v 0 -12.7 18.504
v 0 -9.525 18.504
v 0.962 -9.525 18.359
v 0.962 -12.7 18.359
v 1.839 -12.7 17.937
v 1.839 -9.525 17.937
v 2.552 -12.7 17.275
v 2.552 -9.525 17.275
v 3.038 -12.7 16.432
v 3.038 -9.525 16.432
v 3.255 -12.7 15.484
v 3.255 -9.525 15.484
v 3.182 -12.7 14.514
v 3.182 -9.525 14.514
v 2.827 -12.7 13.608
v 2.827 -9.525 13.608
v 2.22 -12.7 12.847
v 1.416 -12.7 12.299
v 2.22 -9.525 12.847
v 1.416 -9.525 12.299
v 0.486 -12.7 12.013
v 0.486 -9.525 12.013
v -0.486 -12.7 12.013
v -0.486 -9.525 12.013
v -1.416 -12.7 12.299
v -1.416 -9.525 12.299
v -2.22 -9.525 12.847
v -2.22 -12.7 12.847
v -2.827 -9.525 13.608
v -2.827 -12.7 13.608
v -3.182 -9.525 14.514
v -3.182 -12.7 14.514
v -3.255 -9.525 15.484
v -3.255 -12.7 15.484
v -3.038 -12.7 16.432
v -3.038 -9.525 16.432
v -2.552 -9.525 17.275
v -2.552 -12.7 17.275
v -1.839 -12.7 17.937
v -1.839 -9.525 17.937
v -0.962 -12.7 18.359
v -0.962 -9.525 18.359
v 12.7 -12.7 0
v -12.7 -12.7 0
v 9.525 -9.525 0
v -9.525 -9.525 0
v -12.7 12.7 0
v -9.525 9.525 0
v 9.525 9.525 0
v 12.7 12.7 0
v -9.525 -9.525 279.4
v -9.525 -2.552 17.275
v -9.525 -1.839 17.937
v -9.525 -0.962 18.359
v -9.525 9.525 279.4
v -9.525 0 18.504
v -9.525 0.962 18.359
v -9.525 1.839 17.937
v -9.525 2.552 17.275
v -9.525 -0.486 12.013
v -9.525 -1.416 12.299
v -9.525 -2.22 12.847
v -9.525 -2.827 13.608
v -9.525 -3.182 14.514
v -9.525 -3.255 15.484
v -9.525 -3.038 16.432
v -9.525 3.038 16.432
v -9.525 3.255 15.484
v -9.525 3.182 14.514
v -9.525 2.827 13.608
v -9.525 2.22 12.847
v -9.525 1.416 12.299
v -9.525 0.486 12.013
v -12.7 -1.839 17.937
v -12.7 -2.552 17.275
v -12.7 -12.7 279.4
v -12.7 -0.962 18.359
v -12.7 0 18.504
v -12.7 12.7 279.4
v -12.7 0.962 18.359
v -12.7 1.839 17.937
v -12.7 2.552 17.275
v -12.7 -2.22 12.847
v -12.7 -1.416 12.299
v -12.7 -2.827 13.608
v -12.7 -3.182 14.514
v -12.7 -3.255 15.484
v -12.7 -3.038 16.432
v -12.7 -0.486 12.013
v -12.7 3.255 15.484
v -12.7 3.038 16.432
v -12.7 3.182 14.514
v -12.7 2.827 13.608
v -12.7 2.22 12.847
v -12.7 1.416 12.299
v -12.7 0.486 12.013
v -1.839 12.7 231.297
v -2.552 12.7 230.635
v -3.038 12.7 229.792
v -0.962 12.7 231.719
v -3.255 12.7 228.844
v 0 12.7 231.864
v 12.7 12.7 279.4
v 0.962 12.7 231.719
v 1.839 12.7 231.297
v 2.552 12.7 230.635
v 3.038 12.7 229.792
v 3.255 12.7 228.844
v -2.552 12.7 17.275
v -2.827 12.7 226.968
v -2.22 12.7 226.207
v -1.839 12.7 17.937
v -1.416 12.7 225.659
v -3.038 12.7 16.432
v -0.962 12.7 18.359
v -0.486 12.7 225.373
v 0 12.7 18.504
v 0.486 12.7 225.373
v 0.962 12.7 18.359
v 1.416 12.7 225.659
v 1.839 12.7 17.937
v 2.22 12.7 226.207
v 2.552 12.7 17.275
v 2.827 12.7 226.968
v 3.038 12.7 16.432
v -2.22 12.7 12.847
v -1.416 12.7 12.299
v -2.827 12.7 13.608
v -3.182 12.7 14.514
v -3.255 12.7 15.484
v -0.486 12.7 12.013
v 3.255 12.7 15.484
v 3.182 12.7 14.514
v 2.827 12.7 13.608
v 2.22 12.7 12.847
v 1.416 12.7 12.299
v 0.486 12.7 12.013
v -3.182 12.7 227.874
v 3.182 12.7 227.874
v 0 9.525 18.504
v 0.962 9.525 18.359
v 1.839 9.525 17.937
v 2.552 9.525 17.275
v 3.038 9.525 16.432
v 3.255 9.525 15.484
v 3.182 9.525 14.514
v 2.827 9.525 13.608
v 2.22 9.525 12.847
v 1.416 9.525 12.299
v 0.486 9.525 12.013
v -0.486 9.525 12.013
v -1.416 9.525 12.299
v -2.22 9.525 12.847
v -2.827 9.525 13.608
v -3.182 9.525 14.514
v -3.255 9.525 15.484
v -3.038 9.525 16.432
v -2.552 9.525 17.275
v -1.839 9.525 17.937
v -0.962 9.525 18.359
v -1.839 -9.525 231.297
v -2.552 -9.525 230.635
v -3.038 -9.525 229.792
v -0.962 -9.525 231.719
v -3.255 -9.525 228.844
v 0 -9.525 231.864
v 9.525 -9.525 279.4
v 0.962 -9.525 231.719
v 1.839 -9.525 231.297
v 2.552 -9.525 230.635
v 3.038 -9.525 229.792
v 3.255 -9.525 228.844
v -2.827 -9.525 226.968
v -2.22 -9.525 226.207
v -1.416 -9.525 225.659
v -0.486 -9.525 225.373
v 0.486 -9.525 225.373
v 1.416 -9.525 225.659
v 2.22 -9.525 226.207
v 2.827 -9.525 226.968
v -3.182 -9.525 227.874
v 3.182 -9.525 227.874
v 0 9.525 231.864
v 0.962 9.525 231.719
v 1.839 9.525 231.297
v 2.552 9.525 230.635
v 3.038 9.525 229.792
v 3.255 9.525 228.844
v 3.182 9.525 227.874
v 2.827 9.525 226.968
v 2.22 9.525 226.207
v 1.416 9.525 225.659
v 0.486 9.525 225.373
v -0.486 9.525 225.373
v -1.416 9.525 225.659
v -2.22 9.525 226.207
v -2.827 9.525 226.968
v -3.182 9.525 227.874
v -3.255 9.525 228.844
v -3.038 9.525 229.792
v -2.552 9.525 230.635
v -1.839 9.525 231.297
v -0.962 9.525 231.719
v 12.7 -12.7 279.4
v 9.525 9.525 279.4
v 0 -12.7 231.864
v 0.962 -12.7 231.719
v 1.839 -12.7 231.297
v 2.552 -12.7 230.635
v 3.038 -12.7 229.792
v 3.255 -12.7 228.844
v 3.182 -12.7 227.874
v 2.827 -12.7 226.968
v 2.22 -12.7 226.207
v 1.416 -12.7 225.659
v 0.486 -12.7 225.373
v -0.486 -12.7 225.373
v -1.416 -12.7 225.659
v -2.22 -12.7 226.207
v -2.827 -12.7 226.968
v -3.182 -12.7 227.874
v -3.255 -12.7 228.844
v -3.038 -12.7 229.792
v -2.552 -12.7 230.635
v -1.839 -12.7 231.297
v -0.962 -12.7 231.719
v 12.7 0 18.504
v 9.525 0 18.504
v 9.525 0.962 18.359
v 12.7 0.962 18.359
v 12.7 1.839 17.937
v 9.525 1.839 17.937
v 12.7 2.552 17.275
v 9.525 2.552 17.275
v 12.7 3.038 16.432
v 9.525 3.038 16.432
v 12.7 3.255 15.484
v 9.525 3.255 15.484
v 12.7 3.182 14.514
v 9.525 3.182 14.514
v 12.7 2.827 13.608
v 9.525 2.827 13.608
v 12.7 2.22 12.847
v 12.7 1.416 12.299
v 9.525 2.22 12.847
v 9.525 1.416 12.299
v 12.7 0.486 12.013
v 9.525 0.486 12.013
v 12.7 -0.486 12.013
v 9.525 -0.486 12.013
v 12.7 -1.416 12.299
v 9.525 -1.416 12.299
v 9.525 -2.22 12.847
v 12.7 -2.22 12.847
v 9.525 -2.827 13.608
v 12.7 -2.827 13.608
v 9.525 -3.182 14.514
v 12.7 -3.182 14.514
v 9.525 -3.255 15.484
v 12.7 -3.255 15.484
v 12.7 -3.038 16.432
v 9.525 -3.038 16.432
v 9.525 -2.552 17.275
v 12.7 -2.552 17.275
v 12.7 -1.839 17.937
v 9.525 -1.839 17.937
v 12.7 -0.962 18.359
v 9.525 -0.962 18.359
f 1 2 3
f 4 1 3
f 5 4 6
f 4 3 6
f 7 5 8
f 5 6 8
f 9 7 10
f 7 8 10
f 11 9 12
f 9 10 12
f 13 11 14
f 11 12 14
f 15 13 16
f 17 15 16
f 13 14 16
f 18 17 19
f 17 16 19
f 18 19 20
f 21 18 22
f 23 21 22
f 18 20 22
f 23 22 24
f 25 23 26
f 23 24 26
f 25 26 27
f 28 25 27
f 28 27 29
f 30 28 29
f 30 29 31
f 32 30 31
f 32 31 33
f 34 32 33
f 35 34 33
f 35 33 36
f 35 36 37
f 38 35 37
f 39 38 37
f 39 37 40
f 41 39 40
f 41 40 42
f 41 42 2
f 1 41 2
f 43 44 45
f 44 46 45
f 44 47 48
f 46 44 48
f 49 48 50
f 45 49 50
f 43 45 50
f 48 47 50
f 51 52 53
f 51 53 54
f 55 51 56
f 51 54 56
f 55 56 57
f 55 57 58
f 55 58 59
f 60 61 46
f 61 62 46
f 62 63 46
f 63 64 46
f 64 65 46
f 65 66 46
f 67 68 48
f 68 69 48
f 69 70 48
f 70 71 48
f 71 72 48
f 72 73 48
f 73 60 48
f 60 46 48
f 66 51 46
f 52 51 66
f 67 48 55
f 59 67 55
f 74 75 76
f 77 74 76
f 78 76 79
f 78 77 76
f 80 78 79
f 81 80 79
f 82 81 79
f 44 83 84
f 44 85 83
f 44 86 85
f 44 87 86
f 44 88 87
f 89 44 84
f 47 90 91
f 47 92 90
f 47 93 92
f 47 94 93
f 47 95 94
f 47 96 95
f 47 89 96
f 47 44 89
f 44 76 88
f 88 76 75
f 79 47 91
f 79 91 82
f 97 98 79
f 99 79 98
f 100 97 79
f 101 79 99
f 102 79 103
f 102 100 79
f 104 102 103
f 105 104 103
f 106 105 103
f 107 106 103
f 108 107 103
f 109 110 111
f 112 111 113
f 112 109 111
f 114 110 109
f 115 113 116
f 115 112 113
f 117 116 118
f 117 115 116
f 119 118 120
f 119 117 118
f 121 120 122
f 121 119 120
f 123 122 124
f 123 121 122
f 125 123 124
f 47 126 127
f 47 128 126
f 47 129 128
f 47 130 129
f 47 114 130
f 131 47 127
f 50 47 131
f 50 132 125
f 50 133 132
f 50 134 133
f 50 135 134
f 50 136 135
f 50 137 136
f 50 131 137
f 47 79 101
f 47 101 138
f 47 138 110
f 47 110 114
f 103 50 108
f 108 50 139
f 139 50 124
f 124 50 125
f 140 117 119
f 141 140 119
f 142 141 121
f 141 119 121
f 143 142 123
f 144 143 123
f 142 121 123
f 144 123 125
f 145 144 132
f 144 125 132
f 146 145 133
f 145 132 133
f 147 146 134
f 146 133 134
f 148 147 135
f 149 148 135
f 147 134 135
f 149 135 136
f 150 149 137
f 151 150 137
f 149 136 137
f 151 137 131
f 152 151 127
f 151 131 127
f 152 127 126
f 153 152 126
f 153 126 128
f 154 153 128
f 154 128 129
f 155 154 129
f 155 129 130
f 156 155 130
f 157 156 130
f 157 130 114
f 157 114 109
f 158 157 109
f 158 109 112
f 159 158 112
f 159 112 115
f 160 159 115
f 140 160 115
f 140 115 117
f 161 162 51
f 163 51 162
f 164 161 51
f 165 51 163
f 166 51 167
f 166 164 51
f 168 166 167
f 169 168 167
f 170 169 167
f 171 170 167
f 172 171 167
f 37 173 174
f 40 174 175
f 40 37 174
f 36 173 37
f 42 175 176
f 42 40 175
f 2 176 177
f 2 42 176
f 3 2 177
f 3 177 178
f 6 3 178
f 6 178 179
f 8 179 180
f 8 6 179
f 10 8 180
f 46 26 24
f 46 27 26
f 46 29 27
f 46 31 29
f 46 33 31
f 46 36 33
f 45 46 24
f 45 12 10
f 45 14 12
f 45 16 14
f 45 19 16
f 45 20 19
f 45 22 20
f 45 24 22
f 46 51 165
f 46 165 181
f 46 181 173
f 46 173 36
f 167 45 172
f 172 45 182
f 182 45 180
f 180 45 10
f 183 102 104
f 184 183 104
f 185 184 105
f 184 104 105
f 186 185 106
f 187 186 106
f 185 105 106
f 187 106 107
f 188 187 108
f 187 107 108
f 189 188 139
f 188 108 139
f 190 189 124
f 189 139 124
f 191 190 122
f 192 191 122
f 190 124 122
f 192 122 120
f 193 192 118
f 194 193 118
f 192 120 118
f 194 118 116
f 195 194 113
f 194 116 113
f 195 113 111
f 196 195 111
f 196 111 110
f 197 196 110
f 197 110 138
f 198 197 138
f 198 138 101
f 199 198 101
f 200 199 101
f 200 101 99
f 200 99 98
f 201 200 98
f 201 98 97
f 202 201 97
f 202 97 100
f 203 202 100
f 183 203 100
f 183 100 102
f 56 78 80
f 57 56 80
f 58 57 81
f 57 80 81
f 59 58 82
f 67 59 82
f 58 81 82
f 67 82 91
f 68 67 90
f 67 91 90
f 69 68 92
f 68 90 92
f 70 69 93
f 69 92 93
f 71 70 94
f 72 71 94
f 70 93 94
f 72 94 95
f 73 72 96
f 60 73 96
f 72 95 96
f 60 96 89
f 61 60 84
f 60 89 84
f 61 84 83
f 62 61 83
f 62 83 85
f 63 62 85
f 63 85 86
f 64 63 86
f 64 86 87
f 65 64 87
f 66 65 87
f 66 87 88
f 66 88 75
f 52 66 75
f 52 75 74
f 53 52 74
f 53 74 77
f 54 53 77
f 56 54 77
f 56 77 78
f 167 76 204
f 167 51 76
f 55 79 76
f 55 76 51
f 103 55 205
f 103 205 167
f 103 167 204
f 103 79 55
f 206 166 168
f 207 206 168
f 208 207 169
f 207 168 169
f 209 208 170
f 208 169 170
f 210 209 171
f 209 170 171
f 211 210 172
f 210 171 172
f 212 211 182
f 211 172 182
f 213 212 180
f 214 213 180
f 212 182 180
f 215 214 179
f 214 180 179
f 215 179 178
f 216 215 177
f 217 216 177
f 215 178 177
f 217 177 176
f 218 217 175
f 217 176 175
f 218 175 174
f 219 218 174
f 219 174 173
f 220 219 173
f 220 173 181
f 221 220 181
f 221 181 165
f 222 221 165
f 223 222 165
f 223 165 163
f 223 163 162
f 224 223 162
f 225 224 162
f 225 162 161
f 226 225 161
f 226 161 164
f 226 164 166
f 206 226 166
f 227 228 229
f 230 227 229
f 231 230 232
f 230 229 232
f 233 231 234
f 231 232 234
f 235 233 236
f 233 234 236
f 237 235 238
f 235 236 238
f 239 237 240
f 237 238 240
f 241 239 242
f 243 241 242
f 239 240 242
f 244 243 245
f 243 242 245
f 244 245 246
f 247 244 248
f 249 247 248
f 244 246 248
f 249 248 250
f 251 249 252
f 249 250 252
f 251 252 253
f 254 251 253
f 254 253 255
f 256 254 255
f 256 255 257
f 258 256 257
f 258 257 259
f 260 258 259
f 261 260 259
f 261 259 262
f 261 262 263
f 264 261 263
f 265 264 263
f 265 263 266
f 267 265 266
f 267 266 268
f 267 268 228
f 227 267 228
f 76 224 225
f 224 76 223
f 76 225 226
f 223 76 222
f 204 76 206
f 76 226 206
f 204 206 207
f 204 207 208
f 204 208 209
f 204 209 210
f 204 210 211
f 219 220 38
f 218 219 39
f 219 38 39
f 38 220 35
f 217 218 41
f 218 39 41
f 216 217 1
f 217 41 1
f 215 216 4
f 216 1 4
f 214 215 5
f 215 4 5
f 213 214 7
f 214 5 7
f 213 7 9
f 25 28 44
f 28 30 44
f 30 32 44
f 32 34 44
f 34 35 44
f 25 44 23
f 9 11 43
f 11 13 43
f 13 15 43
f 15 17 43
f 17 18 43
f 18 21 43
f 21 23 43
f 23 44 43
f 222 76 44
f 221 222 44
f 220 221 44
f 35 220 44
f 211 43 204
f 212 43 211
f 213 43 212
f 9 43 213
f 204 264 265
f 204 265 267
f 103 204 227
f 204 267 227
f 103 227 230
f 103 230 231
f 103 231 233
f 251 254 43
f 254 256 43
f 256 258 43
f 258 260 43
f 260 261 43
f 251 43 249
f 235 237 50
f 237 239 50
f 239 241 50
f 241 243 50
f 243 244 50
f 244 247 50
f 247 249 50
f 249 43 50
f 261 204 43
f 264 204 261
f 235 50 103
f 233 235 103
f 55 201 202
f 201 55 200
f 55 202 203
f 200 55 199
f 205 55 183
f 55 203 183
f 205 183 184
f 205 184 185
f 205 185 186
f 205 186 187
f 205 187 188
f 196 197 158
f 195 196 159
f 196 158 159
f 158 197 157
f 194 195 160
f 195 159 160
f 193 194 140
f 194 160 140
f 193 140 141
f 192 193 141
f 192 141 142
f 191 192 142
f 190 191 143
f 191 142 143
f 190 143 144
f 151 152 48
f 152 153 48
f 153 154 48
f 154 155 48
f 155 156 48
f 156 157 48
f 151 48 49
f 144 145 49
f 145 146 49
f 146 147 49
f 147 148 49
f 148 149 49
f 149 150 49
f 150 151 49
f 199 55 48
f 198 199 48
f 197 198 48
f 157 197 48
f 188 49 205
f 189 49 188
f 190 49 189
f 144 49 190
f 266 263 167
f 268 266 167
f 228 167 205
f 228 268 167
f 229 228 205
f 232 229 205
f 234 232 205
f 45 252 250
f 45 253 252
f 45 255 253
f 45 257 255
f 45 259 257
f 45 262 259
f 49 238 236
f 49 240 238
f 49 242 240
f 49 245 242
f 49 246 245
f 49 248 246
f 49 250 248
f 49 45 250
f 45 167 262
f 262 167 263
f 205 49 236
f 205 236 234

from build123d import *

# Parameters (mm, degrees)
SKETCH2_W           = 25.4
SKETCH2_H           = 25.4
BOSS_EXTRUDE1_DEPTH = 279.4
SKETCH4_W           = 19.05
SKETCH4_H           = 19.05
CUT_EXTRUDE1_DEPTH  = 280.9766776
SKETCH5_R           = 3.2639
CUT_EXTRUDE2_DEPTH  = 281.839473721
SKETCH6_R           = 3.2639
CUT_EXTRUDE3_DEPTH  = 281.839473721
SKETCH7_R           = 3.2639
CUT_EXTRUDE4_DEPTH  = 281.839473721


with BuildPart() as part:
    # Sketch2 → Boss-Extrude1 (new body)
    with BuildSketch(Plane.XY):
        Rectangle(SKETCH2_W, SKETCH2_H)
    extrude(amount=BOSS_EXTRUDE1_DEPTH)

    # Sketch4 → Cut-Extrude1 (cut, through all)
    with BuildSketch(Plane.XY):
        Rectangle(SKETCH4_W, SKETCH4_H)
    extrude(amount=CUT_EXTRUDE1_DEPTH, mode=Mode.SUBTRACT)

    # Sketch5 → Cut-Extrude2 (cut, through all)
    with BuildSketch(Plane(origin=(0, 12.7, 0), x_dir=(1, 0, 0), z_dir=(0, 1, 0))):
        with Locations(Location((0, -15.24, 0), (0, 0, 270))):
            Circle(SKETCH5_R)
    extrude(amount=-CUT_EXTRUDE2_DEPTH, mode=Mode.SUBTRACT)

    # Sketch6 → Cut-Extrude3 (cut, through all)
    with BuildSketch(Plane(origin=(0, 12.7, 0), x_dir=(1, 0, 0), z_dir=(0, 1, 0))):
        with Locations(Location((0, -228.6, 0), (0, 0, 270))):
            Circle(SKETCH6_R)
    extrude(amount=-CUT_EXTRUDE3_DEPTH, mode=Mode.SUBTRACT)

    # Sketch7 → Cut-Extrude4 (cut, through all)
    with BuildSketch(Plane.ZY.offset(12.7)):
        with Locations((15.24, 0)):
            Circle(SKETCH7_R)
    extrude(amount=-CUT_EXTRUDE4_DEPTH, mode=Mode.SUBTRACT)


solid = part.part
